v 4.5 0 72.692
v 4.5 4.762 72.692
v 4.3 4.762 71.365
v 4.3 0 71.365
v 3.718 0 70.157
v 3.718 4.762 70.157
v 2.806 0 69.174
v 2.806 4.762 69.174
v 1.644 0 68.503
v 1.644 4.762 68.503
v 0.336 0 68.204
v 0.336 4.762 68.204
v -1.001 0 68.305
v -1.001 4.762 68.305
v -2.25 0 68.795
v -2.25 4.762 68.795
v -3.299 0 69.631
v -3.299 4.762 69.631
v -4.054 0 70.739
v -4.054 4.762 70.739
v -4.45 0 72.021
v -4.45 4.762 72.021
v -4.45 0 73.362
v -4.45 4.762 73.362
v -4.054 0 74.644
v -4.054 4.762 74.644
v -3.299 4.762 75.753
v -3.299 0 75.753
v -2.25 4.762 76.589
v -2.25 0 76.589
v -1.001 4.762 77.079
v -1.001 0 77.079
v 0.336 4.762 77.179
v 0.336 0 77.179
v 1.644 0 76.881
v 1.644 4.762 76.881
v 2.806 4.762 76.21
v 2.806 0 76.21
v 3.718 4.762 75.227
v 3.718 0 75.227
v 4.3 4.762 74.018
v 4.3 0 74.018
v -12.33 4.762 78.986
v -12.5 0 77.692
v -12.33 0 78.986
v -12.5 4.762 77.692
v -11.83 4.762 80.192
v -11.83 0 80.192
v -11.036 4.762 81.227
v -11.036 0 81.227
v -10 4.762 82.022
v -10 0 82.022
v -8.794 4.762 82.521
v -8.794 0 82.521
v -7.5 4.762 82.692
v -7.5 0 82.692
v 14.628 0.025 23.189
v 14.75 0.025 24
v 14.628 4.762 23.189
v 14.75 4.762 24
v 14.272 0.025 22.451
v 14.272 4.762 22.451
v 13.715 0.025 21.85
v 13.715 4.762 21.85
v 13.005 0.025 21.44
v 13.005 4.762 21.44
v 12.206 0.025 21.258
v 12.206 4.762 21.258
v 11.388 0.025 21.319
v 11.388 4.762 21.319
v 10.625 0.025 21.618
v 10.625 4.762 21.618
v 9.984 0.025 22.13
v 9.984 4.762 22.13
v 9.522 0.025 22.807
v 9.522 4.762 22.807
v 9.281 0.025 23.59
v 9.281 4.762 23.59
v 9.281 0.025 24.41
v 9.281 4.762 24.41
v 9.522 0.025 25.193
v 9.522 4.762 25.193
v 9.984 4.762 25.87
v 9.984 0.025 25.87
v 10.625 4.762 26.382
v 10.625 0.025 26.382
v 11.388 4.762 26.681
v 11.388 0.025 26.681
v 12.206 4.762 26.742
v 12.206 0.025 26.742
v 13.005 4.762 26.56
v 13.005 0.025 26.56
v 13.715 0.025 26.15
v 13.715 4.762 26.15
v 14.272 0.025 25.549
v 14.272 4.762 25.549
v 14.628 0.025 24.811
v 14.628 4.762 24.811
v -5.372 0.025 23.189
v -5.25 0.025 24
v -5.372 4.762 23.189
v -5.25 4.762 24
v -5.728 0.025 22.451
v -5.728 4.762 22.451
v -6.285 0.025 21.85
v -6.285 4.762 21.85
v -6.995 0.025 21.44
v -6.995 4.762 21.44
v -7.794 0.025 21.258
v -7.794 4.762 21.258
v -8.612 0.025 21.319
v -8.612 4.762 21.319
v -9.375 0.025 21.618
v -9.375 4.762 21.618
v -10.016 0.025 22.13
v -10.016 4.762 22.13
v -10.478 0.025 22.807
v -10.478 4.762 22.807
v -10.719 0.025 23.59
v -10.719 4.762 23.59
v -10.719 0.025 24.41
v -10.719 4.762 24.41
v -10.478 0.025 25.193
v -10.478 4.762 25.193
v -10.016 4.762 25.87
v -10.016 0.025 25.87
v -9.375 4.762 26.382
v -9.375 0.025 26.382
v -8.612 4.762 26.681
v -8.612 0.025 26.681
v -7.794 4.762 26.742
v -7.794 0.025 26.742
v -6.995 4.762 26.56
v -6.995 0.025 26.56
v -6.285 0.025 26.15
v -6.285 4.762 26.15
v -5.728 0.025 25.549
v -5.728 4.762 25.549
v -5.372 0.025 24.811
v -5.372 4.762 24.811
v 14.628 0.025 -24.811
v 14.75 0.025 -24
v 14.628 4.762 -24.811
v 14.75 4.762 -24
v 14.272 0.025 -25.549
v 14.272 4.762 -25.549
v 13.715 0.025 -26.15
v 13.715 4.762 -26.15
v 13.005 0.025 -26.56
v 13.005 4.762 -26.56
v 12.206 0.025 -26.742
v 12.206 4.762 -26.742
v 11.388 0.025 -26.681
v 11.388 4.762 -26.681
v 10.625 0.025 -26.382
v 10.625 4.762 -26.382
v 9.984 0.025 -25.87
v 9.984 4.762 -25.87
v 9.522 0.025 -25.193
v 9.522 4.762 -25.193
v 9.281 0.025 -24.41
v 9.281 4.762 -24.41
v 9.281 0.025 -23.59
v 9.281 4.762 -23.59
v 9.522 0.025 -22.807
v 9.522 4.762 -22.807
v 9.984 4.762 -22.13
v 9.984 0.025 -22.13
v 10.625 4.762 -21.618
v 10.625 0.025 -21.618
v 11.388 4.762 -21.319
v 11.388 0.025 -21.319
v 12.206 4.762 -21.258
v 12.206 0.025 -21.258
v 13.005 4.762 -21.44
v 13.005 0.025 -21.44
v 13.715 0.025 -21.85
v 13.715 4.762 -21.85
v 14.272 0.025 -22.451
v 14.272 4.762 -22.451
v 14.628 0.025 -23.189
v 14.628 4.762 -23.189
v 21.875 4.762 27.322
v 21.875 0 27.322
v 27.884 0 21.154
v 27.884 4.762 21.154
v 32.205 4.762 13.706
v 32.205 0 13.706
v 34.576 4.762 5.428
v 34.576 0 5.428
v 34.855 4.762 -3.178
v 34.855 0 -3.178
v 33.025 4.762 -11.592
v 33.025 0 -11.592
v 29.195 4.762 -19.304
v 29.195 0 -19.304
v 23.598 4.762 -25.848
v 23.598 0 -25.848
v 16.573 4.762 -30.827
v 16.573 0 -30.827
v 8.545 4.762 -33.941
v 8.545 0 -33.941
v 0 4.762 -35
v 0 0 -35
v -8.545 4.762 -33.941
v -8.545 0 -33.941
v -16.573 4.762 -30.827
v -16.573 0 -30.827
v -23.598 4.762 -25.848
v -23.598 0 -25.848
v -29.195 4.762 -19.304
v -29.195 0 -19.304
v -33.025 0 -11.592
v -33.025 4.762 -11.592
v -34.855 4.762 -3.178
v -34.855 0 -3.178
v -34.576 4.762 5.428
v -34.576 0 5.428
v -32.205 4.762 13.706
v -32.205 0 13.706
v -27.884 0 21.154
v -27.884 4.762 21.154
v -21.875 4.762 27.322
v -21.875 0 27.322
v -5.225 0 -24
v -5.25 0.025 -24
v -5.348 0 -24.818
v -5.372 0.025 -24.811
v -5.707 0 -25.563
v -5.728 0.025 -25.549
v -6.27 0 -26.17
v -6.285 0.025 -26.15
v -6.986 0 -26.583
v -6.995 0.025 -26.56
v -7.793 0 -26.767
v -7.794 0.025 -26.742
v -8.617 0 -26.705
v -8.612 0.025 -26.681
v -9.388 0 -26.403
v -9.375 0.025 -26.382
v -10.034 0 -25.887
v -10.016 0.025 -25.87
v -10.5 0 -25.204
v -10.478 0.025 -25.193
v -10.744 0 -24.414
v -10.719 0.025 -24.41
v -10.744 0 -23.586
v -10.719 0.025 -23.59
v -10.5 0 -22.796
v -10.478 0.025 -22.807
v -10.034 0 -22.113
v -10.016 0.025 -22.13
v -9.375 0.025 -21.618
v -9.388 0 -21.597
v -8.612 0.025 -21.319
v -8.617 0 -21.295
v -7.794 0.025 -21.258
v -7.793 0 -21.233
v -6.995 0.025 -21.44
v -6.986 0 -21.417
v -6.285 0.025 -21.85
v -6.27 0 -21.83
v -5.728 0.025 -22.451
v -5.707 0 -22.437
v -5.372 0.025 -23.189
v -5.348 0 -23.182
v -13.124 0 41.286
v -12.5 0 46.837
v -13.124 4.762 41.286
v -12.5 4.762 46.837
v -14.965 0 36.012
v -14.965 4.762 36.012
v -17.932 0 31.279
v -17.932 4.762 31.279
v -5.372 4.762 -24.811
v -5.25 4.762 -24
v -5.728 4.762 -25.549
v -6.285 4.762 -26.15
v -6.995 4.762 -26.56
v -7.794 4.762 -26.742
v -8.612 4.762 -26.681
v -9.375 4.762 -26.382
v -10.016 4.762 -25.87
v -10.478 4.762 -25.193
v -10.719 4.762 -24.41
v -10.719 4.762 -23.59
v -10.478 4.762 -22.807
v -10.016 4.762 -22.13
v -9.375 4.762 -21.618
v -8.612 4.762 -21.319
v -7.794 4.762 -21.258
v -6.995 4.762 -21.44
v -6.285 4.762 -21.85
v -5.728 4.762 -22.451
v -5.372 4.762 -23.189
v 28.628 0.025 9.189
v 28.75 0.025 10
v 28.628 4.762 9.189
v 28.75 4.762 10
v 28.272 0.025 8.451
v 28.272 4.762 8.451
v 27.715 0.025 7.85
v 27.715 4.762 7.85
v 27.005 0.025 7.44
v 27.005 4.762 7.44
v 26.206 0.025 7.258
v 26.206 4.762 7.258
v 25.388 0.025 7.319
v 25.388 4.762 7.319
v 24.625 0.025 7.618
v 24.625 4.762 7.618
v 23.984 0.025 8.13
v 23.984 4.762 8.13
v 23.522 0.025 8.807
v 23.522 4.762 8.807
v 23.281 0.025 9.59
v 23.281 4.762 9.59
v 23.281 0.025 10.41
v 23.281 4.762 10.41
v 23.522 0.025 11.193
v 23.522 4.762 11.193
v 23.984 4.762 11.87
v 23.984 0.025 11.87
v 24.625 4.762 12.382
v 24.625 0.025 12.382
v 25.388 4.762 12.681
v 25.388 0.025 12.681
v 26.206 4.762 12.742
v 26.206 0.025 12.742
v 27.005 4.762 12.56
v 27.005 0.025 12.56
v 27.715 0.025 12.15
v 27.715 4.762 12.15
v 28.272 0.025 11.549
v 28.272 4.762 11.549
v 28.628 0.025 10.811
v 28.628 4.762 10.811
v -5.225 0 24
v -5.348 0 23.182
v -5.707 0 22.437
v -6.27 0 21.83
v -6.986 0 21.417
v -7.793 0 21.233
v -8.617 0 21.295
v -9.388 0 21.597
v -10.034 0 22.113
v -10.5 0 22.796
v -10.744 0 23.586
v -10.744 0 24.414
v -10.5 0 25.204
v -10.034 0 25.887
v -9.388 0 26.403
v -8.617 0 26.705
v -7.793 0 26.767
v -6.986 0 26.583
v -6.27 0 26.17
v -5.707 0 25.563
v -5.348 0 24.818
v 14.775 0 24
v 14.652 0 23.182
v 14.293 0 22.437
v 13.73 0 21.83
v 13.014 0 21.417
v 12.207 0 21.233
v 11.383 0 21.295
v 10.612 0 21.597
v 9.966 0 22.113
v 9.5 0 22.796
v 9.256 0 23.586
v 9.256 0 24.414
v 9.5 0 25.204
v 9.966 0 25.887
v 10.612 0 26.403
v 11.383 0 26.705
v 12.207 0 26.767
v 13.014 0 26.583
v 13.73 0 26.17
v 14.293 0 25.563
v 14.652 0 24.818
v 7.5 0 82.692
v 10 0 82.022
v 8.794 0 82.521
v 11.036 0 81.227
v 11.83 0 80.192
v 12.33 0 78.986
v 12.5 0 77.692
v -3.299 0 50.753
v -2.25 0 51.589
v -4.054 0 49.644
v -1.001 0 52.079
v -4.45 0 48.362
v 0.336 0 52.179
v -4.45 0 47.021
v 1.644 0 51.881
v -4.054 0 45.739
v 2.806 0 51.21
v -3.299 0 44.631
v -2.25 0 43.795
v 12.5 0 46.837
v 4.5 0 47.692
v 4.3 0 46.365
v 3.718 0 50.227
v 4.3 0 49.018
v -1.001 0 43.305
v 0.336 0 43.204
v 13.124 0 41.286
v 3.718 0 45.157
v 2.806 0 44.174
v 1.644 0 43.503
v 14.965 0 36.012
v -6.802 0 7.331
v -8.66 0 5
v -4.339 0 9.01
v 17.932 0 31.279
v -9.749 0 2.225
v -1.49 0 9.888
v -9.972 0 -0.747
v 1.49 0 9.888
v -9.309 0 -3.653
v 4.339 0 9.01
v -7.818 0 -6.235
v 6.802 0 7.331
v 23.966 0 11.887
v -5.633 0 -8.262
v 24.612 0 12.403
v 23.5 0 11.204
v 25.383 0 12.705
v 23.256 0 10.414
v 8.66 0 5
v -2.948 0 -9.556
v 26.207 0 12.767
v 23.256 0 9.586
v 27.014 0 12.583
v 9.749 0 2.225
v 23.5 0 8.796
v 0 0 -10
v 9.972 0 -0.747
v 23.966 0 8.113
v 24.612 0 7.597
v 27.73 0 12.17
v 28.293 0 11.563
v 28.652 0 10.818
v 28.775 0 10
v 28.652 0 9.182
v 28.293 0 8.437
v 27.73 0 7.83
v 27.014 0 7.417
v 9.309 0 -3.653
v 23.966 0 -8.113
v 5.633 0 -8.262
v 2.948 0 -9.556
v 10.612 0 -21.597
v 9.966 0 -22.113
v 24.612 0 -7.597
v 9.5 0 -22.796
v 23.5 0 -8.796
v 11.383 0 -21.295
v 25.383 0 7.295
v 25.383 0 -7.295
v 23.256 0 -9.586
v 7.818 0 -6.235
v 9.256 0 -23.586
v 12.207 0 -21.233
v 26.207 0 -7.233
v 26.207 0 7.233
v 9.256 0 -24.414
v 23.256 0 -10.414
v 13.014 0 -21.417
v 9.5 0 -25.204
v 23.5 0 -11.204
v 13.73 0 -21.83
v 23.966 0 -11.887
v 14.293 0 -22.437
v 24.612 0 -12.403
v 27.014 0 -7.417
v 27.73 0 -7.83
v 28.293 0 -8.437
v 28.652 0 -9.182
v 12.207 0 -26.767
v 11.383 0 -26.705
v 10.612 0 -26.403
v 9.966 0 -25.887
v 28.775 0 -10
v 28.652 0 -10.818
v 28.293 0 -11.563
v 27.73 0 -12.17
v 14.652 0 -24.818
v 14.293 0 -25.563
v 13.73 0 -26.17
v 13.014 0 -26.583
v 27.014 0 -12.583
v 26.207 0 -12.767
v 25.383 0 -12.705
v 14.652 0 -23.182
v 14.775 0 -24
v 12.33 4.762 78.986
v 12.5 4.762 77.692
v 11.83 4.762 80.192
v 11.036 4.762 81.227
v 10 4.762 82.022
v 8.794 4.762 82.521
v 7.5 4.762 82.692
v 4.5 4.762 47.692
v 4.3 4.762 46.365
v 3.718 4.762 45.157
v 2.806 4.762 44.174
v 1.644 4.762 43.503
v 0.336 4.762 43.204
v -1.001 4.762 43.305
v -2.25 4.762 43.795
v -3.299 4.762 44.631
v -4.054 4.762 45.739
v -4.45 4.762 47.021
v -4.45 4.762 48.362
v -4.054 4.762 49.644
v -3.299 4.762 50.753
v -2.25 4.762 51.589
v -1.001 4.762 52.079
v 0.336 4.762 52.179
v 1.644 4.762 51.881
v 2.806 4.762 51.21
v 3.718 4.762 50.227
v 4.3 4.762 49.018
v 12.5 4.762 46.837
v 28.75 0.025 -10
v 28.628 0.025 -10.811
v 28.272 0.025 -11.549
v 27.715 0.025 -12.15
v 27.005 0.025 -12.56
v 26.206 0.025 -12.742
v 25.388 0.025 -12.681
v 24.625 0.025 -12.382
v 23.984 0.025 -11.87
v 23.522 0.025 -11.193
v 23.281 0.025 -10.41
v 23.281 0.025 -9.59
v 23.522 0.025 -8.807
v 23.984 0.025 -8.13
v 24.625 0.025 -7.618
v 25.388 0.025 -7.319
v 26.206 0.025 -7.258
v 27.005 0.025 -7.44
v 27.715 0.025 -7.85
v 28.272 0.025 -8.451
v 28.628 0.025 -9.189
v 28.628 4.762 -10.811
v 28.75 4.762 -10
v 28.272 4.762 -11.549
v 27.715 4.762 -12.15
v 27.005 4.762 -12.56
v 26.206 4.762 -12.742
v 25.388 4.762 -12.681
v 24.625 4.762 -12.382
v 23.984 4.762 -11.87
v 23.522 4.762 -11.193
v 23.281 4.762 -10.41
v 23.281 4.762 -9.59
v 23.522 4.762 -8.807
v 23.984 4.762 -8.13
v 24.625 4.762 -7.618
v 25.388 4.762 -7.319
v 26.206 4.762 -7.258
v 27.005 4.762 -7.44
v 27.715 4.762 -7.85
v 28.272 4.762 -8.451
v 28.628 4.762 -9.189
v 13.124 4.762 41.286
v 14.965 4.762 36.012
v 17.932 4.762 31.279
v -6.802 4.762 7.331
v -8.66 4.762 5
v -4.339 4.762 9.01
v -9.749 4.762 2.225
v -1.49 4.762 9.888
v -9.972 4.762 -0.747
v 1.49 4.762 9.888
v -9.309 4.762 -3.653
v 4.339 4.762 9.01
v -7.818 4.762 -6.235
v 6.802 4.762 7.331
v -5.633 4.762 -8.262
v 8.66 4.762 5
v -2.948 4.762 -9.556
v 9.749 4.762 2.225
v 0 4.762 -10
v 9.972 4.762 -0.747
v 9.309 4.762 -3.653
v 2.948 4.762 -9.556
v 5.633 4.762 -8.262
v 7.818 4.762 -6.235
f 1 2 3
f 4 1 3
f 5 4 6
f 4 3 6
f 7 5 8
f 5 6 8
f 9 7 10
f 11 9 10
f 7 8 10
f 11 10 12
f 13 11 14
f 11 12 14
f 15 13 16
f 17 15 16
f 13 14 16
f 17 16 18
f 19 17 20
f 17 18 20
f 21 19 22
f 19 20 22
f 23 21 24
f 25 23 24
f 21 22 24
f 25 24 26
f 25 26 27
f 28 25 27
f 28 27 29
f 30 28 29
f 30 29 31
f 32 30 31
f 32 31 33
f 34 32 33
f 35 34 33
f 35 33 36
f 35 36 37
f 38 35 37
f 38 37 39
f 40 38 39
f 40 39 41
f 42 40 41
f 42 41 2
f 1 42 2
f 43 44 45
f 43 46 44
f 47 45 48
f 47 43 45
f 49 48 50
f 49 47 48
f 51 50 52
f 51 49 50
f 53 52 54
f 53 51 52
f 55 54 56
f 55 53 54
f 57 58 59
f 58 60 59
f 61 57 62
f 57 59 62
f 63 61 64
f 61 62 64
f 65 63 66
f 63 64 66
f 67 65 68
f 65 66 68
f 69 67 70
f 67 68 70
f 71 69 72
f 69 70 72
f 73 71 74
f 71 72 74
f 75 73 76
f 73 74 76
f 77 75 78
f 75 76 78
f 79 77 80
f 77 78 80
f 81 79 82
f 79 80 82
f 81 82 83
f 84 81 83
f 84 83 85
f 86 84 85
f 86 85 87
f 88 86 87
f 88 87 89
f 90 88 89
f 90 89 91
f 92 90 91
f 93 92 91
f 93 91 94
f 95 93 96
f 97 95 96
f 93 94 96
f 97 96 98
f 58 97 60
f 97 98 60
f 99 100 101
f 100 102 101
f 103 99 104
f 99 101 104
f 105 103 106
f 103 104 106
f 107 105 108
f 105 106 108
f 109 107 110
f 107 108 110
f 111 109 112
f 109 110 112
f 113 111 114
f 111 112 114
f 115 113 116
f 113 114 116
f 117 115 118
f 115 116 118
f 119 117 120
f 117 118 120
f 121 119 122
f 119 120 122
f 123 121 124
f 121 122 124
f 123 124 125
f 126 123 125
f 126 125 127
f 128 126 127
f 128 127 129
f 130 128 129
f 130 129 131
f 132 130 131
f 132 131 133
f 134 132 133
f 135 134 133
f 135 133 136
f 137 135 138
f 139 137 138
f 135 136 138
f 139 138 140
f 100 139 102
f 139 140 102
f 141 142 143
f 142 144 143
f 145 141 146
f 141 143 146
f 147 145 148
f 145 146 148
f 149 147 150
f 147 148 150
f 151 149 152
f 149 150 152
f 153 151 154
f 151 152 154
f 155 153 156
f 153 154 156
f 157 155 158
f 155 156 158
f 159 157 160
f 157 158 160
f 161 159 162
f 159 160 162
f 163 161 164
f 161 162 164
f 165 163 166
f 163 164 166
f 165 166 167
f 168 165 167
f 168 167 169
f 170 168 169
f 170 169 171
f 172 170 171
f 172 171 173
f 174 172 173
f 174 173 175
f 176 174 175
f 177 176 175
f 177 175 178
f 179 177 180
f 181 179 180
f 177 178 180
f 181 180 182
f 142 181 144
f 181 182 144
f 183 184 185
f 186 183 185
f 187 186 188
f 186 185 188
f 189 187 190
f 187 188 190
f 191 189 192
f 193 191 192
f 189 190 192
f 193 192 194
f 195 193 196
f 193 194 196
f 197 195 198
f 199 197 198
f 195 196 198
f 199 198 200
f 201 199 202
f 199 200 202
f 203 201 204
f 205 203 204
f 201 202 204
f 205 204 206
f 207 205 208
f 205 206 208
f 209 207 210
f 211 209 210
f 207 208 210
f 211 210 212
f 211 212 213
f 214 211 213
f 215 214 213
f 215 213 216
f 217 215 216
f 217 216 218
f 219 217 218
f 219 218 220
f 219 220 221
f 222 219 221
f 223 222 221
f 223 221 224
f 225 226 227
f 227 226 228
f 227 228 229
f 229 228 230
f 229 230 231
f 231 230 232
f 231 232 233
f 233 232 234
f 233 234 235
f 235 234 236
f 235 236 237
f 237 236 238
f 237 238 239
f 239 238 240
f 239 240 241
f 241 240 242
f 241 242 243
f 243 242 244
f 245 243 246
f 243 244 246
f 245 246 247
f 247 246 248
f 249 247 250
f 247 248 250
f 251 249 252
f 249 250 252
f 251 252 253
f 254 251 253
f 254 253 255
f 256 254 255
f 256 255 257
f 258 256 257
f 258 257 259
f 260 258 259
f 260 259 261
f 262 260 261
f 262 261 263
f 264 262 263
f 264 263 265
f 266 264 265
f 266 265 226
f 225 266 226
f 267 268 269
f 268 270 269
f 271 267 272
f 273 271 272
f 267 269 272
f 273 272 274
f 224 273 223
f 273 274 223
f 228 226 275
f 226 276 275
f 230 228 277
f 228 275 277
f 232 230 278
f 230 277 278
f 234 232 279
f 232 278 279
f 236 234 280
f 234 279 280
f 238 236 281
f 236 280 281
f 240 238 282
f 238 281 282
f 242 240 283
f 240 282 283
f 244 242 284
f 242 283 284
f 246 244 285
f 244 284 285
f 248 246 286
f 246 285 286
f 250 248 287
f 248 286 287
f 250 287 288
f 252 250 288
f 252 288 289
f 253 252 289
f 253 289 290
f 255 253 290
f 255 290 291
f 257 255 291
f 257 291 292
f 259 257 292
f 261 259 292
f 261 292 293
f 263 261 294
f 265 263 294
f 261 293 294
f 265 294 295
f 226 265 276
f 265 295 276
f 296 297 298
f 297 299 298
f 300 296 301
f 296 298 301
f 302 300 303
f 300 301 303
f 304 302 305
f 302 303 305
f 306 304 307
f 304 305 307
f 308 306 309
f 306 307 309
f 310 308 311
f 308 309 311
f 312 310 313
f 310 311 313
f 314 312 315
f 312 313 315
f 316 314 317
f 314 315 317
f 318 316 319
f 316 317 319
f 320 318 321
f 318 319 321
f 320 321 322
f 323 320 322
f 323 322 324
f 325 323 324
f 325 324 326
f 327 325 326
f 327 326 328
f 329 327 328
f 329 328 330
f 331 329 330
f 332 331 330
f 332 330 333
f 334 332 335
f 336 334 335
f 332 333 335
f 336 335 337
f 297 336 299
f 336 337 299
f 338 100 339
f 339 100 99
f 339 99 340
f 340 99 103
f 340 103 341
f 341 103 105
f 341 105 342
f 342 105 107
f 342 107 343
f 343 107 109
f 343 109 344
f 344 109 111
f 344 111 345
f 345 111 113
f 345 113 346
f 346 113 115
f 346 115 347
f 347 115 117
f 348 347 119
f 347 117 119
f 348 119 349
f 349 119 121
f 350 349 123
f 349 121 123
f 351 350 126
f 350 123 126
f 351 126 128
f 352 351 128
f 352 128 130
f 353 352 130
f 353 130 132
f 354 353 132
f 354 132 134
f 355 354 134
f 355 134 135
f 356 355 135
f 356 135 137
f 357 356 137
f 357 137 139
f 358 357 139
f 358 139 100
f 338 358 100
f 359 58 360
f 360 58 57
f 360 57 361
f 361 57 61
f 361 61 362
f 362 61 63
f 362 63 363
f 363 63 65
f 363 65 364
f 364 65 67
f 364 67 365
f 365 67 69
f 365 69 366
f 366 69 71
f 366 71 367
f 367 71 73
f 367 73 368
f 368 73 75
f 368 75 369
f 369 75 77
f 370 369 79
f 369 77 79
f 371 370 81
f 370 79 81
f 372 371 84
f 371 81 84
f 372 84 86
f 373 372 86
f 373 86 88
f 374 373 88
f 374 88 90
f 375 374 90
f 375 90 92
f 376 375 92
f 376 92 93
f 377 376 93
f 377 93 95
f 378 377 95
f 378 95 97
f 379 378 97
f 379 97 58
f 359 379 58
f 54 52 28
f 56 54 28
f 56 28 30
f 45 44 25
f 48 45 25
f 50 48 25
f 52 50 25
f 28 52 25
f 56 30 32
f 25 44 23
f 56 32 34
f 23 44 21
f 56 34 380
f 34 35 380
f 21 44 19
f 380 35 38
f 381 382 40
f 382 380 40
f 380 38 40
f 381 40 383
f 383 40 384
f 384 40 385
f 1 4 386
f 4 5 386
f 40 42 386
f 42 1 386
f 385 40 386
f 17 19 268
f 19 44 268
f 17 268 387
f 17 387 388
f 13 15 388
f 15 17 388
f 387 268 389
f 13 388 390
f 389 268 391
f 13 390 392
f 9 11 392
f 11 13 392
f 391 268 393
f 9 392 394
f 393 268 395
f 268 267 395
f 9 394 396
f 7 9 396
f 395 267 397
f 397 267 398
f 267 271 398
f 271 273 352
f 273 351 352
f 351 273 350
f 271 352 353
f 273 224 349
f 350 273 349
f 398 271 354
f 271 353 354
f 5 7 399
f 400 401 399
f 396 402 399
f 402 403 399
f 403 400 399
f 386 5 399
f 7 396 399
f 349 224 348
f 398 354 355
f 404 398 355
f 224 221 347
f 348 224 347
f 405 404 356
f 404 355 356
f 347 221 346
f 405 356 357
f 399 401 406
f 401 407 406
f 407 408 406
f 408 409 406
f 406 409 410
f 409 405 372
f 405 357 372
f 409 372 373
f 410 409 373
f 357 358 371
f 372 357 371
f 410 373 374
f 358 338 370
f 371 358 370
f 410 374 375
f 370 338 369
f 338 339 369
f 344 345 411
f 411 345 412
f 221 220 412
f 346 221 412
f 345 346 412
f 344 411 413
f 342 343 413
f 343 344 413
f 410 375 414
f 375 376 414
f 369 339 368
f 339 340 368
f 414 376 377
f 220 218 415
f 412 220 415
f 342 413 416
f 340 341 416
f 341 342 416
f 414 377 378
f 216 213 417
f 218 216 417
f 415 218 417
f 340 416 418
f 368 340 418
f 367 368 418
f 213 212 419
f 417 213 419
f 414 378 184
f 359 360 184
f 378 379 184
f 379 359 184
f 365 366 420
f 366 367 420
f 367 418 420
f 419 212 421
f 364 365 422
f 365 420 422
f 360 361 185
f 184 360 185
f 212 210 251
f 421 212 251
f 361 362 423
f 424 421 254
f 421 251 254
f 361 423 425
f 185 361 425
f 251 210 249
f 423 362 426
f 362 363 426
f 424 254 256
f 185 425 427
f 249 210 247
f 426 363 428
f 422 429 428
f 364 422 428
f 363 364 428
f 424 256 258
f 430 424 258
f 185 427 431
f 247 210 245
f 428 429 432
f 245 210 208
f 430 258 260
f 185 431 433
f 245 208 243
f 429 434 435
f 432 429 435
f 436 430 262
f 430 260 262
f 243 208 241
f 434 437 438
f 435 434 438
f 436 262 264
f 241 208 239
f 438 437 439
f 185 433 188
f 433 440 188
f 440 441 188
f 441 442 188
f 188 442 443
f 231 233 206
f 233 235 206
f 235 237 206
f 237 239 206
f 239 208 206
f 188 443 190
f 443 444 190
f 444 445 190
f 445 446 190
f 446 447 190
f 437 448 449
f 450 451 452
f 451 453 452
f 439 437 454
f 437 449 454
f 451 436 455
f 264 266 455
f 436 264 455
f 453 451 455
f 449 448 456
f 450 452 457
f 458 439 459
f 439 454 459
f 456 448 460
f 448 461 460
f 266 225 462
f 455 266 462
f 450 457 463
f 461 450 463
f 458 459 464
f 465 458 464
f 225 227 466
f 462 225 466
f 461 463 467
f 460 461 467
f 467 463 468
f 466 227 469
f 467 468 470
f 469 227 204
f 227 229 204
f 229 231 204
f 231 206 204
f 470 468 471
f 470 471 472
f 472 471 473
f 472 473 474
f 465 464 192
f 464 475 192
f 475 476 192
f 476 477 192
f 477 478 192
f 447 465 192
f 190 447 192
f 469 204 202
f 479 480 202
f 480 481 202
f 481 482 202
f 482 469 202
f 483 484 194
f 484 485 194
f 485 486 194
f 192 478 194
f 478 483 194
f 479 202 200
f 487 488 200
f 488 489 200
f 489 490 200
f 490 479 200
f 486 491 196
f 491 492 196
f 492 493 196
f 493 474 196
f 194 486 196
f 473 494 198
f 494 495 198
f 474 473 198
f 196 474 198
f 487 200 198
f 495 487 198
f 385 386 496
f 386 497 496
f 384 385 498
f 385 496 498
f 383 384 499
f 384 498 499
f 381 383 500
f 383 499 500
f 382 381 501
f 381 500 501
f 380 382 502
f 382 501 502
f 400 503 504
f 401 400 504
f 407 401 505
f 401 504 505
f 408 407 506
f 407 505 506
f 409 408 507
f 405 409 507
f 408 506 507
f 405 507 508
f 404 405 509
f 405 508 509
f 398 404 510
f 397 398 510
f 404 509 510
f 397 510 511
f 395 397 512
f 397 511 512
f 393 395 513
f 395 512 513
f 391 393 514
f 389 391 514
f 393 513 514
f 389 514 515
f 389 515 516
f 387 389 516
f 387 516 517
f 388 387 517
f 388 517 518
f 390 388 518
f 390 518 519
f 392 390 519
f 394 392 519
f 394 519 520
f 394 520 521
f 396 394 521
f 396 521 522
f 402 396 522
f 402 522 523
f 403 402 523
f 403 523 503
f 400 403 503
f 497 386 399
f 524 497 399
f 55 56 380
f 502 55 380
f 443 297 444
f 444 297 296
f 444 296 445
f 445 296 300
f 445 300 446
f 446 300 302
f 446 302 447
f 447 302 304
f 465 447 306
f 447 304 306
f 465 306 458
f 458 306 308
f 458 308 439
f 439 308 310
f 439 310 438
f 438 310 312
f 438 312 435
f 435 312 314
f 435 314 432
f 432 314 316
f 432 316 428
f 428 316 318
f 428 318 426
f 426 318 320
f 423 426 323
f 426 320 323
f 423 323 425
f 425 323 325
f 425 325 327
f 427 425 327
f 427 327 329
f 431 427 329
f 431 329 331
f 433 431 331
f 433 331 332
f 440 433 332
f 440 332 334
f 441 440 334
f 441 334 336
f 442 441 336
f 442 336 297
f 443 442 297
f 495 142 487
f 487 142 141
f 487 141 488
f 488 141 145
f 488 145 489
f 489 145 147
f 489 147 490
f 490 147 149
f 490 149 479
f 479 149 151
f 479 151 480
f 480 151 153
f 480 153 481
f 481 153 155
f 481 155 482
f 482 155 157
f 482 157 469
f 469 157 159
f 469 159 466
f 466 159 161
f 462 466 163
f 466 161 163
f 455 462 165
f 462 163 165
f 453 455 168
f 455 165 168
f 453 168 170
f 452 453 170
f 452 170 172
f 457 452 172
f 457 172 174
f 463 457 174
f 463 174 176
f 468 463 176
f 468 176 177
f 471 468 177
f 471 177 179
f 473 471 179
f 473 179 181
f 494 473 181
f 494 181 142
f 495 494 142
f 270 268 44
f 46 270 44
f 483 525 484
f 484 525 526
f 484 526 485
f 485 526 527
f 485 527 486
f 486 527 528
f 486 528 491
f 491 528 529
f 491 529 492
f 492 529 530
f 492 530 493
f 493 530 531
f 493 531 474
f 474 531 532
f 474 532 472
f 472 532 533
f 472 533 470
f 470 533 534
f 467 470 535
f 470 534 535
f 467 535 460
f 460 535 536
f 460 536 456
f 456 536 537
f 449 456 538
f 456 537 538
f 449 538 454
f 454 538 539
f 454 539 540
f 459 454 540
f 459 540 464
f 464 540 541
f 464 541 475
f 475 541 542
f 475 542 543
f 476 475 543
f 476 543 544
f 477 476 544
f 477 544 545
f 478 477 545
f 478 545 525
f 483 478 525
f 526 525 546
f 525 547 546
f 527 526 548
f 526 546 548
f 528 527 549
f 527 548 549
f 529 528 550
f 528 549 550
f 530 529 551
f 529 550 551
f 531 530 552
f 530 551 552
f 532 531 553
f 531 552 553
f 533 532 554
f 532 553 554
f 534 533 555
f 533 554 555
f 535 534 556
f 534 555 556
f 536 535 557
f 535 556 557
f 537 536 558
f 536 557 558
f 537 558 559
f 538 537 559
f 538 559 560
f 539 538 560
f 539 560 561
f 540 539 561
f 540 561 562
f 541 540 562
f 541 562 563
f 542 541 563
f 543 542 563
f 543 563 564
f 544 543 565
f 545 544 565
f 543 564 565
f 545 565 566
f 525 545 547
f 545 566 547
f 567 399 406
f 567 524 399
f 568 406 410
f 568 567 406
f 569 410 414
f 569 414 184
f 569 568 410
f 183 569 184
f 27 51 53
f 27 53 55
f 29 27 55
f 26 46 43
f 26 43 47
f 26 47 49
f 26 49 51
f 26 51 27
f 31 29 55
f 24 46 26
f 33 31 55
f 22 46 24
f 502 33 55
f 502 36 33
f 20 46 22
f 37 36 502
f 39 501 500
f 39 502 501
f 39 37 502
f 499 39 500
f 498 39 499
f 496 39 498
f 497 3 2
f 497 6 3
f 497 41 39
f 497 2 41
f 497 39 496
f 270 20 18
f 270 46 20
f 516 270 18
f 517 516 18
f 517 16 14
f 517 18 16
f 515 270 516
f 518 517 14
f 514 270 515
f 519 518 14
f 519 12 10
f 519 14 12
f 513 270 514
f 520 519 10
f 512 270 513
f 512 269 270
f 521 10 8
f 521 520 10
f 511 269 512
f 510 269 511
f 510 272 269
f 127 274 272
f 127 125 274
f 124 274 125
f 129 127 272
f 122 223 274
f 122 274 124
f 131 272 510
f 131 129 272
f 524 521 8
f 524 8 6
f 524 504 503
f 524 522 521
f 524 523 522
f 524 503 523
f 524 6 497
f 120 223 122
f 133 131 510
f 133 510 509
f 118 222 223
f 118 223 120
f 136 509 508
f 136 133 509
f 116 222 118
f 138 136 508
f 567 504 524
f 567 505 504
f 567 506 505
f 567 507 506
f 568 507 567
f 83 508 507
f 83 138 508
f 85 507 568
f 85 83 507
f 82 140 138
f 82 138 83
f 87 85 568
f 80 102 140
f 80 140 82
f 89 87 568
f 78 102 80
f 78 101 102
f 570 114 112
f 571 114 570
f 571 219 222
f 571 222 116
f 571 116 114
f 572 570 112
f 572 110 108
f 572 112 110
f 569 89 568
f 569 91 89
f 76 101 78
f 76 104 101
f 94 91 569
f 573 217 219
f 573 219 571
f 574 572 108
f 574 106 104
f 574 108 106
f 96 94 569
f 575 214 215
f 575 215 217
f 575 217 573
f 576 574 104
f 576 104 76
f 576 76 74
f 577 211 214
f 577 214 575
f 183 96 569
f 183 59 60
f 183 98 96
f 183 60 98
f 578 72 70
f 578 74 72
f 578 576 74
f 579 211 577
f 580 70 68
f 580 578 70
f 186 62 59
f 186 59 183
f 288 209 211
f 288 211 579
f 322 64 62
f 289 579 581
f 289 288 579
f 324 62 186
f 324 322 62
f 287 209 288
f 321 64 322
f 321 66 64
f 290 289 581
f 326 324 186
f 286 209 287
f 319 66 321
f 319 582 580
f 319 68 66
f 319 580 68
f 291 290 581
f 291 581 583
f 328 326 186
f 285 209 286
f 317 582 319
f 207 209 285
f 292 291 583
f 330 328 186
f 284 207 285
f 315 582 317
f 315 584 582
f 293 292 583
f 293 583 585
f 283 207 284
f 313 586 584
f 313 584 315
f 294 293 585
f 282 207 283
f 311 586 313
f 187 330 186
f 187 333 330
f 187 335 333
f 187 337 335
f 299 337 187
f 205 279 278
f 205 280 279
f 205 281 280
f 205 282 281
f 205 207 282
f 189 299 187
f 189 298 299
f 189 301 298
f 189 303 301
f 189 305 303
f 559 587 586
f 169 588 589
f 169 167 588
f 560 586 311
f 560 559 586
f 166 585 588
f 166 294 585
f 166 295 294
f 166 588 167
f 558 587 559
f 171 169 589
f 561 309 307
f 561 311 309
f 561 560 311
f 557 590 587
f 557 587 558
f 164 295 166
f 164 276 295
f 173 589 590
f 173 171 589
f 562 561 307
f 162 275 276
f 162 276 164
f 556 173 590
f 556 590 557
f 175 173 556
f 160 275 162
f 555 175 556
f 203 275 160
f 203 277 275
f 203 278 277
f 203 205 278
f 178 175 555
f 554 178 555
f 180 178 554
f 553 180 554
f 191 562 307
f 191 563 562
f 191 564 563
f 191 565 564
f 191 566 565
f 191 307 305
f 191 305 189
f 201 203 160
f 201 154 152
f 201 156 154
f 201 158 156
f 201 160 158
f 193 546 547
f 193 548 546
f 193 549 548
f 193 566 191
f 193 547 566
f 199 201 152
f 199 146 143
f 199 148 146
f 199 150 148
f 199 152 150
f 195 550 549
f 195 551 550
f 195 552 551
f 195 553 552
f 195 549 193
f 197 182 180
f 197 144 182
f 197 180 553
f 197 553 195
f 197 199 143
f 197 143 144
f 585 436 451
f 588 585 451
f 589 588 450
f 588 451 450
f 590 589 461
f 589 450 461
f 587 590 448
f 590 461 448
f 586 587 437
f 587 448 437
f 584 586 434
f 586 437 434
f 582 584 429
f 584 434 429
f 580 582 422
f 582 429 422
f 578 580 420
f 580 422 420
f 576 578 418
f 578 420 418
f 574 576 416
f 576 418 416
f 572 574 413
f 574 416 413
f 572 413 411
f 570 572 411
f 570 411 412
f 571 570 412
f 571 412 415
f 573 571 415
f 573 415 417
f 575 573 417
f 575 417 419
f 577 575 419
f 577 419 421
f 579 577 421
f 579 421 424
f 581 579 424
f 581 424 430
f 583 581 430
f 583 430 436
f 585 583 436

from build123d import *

# Parameters (mm, degrees)
BOSS_EXTRUDE1_DEPTH            = 4.7625
SKETCH5_R                      = 10
CUT_EXTRUDE1_DEPTH             = 90.919995629
M8_CLEARANCE_HOLE1_D           = 9
FILLET1_R                      = 25
M5_CLEARANCE_HOLE1_D           = 5.5
M5_CLEARANCE_HOLE1_CSINK_D     = 5.55
M5_CLEARANCE_HOLE1_CSINK_ANGLE = 90
FILLET2_R                      = 5


with BuildPart() as part:
    # Sketch1 → Boss-Extrude1 (new body)
    with BuildSketch(Plane(origin=(0, 0, 0), x_dir=(1, 0, 0), z_dir=(0, 1, 0))):
        with BuildLine():
            Line((-12.5, -82.691742077), (12.5, -82.691742077))
            Line((12.5, -82.691742077), (12.5, -32.691742077))
            ThreePointArc((12.5, -32.691742077), (0, 35), (-12.5, -32.691742077))
            Line((-12.5, -32.691742077), (-12.5, -82.691742077))
        make_face()
    extrude(amount=BOSS_EXTRUDE1_DEPTH)

    # Sketch5 → Cut-Extrude1 (cut, through all)
    with BuildSketch(Plane.XZ):
        with Locations(Location((0, 0, 0), (0, 0, 270))):
            Circle(SKETCH5_R)
    extrude(amount=-CUT_EXTRUDE1_DEPTH, mode=Mode.SUBTRACT)

    # M8 Clearance Hole1 (through all)
    with Locations(Plane(origin=(0, 0, 0), x_dir=(-1, 0, 0), z_dir=(0, -1, 0))):
        with Locations((0, -47.691742077), (0, -72.691742077)):
            Hole(M8_CLEARANCE_HOLE1_D / 2)

    # Fillet1
    fillet1_edges = [part.edges().sort_by_distance(p)[0] for p in [
        (-12.5, 2.38125, 32.691742077),
        (12.5, 2.38125, 32.691742077),
    ]]
    fillet(fillet1_edges, radius=FILLET1_R)

    # M5 Clearance Hole1 (through all)
    with Locations(Plane(origin=(0, 0, 0), x_dir=(-1, 0, 0), z_dir=(0, -1, 0))):
        with Locations((-12, 24), (8, 24), (-26, 10), (-26, -10), (-12, -24), (8, -24)):
            CounterSinkHole(M5_CLEARANCE_HOLE1_D / 2, M5_CLEARANCE_HOLE1_CSINK_D / 2, counter_sink_angle=M5_CLEARANCE_HOLE1_CSINK_ANGLE)

    # Fillet2
    fillet2_edges = [part.edges().sort_by_distance(p)[0] for p in [
        (12.5, 2.38125, 82.691742077),
        (-12.5, 2.38125, 82.691742077),
    ]]
    fillet(fillet2_edges, radius=FILLET2_R)


solid = part.part
